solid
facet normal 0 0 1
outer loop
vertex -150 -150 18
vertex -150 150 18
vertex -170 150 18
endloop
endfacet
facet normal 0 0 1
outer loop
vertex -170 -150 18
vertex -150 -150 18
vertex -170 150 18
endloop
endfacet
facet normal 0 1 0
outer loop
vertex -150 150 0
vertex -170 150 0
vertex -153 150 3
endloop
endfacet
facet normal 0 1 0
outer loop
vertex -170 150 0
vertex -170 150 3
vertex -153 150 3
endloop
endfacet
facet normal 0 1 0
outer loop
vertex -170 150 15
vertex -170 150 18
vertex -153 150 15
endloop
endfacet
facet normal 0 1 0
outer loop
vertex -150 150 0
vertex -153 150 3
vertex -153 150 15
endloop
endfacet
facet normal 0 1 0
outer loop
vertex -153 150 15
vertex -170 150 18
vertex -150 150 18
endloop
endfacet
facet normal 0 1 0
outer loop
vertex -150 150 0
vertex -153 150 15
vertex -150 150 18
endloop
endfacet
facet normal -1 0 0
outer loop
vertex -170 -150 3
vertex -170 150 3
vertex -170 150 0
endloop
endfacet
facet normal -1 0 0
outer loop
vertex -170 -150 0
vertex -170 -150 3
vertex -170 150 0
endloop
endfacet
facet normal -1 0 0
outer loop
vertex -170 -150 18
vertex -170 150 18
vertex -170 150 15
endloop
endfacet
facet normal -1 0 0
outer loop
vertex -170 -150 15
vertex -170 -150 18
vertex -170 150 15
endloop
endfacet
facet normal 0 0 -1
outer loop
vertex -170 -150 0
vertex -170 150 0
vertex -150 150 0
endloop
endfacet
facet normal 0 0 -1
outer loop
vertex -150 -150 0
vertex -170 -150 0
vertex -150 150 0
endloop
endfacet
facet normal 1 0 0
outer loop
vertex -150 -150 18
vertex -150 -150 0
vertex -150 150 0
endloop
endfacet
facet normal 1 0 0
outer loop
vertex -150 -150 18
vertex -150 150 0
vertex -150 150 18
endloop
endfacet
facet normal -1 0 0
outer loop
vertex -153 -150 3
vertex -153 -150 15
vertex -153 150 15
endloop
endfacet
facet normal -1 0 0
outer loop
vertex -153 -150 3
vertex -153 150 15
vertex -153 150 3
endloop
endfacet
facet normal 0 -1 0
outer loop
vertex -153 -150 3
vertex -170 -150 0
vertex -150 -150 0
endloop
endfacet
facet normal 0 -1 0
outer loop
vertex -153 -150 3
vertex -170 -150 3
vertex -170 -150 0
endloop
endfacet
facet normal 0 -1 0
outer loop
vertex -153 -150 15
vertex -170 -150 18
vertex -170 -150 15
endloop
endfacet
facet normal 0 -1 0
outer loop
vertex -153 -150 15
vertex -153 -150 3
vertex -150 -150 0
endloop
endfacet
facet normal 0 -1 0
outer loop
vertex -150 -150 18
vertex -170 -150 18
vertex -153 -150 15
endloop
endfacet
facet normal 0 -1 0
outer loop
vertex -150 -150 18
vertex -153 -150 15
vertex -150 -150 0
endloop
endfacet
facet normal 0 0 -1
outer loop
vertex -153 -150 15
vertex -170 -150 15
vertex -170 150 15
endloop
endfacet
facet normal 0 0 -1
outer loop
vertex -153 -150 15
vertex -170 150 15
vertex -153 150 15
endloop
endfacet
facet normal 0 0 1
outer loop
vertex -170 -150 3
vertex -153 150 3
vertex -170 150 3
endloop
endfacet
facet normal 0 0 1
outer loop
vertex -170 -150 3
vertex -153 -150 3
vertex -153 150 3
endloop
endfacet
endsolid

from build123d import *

# Parameters (mm, degrees)
F2_DEPTH      = 150
F2_DEPTH_BACK = 150


with BuildPart() as f2:
    # F1 (on Front) → F2 (new body, two sides)
    with BuildSketch(Plane.XZ) as f2_sk:
        Polygon((-170, 0), (-150, 0), (-150, 18), (-170, 18), (-170, 15), (-153, 15), (-153, 3), (-170, 3), align=None)
    extrude(amount=F2_DEPTH)
    extrude(f2_sk.sketch, amount=-F2_DEPTH_BACK)


solid = f2.part
